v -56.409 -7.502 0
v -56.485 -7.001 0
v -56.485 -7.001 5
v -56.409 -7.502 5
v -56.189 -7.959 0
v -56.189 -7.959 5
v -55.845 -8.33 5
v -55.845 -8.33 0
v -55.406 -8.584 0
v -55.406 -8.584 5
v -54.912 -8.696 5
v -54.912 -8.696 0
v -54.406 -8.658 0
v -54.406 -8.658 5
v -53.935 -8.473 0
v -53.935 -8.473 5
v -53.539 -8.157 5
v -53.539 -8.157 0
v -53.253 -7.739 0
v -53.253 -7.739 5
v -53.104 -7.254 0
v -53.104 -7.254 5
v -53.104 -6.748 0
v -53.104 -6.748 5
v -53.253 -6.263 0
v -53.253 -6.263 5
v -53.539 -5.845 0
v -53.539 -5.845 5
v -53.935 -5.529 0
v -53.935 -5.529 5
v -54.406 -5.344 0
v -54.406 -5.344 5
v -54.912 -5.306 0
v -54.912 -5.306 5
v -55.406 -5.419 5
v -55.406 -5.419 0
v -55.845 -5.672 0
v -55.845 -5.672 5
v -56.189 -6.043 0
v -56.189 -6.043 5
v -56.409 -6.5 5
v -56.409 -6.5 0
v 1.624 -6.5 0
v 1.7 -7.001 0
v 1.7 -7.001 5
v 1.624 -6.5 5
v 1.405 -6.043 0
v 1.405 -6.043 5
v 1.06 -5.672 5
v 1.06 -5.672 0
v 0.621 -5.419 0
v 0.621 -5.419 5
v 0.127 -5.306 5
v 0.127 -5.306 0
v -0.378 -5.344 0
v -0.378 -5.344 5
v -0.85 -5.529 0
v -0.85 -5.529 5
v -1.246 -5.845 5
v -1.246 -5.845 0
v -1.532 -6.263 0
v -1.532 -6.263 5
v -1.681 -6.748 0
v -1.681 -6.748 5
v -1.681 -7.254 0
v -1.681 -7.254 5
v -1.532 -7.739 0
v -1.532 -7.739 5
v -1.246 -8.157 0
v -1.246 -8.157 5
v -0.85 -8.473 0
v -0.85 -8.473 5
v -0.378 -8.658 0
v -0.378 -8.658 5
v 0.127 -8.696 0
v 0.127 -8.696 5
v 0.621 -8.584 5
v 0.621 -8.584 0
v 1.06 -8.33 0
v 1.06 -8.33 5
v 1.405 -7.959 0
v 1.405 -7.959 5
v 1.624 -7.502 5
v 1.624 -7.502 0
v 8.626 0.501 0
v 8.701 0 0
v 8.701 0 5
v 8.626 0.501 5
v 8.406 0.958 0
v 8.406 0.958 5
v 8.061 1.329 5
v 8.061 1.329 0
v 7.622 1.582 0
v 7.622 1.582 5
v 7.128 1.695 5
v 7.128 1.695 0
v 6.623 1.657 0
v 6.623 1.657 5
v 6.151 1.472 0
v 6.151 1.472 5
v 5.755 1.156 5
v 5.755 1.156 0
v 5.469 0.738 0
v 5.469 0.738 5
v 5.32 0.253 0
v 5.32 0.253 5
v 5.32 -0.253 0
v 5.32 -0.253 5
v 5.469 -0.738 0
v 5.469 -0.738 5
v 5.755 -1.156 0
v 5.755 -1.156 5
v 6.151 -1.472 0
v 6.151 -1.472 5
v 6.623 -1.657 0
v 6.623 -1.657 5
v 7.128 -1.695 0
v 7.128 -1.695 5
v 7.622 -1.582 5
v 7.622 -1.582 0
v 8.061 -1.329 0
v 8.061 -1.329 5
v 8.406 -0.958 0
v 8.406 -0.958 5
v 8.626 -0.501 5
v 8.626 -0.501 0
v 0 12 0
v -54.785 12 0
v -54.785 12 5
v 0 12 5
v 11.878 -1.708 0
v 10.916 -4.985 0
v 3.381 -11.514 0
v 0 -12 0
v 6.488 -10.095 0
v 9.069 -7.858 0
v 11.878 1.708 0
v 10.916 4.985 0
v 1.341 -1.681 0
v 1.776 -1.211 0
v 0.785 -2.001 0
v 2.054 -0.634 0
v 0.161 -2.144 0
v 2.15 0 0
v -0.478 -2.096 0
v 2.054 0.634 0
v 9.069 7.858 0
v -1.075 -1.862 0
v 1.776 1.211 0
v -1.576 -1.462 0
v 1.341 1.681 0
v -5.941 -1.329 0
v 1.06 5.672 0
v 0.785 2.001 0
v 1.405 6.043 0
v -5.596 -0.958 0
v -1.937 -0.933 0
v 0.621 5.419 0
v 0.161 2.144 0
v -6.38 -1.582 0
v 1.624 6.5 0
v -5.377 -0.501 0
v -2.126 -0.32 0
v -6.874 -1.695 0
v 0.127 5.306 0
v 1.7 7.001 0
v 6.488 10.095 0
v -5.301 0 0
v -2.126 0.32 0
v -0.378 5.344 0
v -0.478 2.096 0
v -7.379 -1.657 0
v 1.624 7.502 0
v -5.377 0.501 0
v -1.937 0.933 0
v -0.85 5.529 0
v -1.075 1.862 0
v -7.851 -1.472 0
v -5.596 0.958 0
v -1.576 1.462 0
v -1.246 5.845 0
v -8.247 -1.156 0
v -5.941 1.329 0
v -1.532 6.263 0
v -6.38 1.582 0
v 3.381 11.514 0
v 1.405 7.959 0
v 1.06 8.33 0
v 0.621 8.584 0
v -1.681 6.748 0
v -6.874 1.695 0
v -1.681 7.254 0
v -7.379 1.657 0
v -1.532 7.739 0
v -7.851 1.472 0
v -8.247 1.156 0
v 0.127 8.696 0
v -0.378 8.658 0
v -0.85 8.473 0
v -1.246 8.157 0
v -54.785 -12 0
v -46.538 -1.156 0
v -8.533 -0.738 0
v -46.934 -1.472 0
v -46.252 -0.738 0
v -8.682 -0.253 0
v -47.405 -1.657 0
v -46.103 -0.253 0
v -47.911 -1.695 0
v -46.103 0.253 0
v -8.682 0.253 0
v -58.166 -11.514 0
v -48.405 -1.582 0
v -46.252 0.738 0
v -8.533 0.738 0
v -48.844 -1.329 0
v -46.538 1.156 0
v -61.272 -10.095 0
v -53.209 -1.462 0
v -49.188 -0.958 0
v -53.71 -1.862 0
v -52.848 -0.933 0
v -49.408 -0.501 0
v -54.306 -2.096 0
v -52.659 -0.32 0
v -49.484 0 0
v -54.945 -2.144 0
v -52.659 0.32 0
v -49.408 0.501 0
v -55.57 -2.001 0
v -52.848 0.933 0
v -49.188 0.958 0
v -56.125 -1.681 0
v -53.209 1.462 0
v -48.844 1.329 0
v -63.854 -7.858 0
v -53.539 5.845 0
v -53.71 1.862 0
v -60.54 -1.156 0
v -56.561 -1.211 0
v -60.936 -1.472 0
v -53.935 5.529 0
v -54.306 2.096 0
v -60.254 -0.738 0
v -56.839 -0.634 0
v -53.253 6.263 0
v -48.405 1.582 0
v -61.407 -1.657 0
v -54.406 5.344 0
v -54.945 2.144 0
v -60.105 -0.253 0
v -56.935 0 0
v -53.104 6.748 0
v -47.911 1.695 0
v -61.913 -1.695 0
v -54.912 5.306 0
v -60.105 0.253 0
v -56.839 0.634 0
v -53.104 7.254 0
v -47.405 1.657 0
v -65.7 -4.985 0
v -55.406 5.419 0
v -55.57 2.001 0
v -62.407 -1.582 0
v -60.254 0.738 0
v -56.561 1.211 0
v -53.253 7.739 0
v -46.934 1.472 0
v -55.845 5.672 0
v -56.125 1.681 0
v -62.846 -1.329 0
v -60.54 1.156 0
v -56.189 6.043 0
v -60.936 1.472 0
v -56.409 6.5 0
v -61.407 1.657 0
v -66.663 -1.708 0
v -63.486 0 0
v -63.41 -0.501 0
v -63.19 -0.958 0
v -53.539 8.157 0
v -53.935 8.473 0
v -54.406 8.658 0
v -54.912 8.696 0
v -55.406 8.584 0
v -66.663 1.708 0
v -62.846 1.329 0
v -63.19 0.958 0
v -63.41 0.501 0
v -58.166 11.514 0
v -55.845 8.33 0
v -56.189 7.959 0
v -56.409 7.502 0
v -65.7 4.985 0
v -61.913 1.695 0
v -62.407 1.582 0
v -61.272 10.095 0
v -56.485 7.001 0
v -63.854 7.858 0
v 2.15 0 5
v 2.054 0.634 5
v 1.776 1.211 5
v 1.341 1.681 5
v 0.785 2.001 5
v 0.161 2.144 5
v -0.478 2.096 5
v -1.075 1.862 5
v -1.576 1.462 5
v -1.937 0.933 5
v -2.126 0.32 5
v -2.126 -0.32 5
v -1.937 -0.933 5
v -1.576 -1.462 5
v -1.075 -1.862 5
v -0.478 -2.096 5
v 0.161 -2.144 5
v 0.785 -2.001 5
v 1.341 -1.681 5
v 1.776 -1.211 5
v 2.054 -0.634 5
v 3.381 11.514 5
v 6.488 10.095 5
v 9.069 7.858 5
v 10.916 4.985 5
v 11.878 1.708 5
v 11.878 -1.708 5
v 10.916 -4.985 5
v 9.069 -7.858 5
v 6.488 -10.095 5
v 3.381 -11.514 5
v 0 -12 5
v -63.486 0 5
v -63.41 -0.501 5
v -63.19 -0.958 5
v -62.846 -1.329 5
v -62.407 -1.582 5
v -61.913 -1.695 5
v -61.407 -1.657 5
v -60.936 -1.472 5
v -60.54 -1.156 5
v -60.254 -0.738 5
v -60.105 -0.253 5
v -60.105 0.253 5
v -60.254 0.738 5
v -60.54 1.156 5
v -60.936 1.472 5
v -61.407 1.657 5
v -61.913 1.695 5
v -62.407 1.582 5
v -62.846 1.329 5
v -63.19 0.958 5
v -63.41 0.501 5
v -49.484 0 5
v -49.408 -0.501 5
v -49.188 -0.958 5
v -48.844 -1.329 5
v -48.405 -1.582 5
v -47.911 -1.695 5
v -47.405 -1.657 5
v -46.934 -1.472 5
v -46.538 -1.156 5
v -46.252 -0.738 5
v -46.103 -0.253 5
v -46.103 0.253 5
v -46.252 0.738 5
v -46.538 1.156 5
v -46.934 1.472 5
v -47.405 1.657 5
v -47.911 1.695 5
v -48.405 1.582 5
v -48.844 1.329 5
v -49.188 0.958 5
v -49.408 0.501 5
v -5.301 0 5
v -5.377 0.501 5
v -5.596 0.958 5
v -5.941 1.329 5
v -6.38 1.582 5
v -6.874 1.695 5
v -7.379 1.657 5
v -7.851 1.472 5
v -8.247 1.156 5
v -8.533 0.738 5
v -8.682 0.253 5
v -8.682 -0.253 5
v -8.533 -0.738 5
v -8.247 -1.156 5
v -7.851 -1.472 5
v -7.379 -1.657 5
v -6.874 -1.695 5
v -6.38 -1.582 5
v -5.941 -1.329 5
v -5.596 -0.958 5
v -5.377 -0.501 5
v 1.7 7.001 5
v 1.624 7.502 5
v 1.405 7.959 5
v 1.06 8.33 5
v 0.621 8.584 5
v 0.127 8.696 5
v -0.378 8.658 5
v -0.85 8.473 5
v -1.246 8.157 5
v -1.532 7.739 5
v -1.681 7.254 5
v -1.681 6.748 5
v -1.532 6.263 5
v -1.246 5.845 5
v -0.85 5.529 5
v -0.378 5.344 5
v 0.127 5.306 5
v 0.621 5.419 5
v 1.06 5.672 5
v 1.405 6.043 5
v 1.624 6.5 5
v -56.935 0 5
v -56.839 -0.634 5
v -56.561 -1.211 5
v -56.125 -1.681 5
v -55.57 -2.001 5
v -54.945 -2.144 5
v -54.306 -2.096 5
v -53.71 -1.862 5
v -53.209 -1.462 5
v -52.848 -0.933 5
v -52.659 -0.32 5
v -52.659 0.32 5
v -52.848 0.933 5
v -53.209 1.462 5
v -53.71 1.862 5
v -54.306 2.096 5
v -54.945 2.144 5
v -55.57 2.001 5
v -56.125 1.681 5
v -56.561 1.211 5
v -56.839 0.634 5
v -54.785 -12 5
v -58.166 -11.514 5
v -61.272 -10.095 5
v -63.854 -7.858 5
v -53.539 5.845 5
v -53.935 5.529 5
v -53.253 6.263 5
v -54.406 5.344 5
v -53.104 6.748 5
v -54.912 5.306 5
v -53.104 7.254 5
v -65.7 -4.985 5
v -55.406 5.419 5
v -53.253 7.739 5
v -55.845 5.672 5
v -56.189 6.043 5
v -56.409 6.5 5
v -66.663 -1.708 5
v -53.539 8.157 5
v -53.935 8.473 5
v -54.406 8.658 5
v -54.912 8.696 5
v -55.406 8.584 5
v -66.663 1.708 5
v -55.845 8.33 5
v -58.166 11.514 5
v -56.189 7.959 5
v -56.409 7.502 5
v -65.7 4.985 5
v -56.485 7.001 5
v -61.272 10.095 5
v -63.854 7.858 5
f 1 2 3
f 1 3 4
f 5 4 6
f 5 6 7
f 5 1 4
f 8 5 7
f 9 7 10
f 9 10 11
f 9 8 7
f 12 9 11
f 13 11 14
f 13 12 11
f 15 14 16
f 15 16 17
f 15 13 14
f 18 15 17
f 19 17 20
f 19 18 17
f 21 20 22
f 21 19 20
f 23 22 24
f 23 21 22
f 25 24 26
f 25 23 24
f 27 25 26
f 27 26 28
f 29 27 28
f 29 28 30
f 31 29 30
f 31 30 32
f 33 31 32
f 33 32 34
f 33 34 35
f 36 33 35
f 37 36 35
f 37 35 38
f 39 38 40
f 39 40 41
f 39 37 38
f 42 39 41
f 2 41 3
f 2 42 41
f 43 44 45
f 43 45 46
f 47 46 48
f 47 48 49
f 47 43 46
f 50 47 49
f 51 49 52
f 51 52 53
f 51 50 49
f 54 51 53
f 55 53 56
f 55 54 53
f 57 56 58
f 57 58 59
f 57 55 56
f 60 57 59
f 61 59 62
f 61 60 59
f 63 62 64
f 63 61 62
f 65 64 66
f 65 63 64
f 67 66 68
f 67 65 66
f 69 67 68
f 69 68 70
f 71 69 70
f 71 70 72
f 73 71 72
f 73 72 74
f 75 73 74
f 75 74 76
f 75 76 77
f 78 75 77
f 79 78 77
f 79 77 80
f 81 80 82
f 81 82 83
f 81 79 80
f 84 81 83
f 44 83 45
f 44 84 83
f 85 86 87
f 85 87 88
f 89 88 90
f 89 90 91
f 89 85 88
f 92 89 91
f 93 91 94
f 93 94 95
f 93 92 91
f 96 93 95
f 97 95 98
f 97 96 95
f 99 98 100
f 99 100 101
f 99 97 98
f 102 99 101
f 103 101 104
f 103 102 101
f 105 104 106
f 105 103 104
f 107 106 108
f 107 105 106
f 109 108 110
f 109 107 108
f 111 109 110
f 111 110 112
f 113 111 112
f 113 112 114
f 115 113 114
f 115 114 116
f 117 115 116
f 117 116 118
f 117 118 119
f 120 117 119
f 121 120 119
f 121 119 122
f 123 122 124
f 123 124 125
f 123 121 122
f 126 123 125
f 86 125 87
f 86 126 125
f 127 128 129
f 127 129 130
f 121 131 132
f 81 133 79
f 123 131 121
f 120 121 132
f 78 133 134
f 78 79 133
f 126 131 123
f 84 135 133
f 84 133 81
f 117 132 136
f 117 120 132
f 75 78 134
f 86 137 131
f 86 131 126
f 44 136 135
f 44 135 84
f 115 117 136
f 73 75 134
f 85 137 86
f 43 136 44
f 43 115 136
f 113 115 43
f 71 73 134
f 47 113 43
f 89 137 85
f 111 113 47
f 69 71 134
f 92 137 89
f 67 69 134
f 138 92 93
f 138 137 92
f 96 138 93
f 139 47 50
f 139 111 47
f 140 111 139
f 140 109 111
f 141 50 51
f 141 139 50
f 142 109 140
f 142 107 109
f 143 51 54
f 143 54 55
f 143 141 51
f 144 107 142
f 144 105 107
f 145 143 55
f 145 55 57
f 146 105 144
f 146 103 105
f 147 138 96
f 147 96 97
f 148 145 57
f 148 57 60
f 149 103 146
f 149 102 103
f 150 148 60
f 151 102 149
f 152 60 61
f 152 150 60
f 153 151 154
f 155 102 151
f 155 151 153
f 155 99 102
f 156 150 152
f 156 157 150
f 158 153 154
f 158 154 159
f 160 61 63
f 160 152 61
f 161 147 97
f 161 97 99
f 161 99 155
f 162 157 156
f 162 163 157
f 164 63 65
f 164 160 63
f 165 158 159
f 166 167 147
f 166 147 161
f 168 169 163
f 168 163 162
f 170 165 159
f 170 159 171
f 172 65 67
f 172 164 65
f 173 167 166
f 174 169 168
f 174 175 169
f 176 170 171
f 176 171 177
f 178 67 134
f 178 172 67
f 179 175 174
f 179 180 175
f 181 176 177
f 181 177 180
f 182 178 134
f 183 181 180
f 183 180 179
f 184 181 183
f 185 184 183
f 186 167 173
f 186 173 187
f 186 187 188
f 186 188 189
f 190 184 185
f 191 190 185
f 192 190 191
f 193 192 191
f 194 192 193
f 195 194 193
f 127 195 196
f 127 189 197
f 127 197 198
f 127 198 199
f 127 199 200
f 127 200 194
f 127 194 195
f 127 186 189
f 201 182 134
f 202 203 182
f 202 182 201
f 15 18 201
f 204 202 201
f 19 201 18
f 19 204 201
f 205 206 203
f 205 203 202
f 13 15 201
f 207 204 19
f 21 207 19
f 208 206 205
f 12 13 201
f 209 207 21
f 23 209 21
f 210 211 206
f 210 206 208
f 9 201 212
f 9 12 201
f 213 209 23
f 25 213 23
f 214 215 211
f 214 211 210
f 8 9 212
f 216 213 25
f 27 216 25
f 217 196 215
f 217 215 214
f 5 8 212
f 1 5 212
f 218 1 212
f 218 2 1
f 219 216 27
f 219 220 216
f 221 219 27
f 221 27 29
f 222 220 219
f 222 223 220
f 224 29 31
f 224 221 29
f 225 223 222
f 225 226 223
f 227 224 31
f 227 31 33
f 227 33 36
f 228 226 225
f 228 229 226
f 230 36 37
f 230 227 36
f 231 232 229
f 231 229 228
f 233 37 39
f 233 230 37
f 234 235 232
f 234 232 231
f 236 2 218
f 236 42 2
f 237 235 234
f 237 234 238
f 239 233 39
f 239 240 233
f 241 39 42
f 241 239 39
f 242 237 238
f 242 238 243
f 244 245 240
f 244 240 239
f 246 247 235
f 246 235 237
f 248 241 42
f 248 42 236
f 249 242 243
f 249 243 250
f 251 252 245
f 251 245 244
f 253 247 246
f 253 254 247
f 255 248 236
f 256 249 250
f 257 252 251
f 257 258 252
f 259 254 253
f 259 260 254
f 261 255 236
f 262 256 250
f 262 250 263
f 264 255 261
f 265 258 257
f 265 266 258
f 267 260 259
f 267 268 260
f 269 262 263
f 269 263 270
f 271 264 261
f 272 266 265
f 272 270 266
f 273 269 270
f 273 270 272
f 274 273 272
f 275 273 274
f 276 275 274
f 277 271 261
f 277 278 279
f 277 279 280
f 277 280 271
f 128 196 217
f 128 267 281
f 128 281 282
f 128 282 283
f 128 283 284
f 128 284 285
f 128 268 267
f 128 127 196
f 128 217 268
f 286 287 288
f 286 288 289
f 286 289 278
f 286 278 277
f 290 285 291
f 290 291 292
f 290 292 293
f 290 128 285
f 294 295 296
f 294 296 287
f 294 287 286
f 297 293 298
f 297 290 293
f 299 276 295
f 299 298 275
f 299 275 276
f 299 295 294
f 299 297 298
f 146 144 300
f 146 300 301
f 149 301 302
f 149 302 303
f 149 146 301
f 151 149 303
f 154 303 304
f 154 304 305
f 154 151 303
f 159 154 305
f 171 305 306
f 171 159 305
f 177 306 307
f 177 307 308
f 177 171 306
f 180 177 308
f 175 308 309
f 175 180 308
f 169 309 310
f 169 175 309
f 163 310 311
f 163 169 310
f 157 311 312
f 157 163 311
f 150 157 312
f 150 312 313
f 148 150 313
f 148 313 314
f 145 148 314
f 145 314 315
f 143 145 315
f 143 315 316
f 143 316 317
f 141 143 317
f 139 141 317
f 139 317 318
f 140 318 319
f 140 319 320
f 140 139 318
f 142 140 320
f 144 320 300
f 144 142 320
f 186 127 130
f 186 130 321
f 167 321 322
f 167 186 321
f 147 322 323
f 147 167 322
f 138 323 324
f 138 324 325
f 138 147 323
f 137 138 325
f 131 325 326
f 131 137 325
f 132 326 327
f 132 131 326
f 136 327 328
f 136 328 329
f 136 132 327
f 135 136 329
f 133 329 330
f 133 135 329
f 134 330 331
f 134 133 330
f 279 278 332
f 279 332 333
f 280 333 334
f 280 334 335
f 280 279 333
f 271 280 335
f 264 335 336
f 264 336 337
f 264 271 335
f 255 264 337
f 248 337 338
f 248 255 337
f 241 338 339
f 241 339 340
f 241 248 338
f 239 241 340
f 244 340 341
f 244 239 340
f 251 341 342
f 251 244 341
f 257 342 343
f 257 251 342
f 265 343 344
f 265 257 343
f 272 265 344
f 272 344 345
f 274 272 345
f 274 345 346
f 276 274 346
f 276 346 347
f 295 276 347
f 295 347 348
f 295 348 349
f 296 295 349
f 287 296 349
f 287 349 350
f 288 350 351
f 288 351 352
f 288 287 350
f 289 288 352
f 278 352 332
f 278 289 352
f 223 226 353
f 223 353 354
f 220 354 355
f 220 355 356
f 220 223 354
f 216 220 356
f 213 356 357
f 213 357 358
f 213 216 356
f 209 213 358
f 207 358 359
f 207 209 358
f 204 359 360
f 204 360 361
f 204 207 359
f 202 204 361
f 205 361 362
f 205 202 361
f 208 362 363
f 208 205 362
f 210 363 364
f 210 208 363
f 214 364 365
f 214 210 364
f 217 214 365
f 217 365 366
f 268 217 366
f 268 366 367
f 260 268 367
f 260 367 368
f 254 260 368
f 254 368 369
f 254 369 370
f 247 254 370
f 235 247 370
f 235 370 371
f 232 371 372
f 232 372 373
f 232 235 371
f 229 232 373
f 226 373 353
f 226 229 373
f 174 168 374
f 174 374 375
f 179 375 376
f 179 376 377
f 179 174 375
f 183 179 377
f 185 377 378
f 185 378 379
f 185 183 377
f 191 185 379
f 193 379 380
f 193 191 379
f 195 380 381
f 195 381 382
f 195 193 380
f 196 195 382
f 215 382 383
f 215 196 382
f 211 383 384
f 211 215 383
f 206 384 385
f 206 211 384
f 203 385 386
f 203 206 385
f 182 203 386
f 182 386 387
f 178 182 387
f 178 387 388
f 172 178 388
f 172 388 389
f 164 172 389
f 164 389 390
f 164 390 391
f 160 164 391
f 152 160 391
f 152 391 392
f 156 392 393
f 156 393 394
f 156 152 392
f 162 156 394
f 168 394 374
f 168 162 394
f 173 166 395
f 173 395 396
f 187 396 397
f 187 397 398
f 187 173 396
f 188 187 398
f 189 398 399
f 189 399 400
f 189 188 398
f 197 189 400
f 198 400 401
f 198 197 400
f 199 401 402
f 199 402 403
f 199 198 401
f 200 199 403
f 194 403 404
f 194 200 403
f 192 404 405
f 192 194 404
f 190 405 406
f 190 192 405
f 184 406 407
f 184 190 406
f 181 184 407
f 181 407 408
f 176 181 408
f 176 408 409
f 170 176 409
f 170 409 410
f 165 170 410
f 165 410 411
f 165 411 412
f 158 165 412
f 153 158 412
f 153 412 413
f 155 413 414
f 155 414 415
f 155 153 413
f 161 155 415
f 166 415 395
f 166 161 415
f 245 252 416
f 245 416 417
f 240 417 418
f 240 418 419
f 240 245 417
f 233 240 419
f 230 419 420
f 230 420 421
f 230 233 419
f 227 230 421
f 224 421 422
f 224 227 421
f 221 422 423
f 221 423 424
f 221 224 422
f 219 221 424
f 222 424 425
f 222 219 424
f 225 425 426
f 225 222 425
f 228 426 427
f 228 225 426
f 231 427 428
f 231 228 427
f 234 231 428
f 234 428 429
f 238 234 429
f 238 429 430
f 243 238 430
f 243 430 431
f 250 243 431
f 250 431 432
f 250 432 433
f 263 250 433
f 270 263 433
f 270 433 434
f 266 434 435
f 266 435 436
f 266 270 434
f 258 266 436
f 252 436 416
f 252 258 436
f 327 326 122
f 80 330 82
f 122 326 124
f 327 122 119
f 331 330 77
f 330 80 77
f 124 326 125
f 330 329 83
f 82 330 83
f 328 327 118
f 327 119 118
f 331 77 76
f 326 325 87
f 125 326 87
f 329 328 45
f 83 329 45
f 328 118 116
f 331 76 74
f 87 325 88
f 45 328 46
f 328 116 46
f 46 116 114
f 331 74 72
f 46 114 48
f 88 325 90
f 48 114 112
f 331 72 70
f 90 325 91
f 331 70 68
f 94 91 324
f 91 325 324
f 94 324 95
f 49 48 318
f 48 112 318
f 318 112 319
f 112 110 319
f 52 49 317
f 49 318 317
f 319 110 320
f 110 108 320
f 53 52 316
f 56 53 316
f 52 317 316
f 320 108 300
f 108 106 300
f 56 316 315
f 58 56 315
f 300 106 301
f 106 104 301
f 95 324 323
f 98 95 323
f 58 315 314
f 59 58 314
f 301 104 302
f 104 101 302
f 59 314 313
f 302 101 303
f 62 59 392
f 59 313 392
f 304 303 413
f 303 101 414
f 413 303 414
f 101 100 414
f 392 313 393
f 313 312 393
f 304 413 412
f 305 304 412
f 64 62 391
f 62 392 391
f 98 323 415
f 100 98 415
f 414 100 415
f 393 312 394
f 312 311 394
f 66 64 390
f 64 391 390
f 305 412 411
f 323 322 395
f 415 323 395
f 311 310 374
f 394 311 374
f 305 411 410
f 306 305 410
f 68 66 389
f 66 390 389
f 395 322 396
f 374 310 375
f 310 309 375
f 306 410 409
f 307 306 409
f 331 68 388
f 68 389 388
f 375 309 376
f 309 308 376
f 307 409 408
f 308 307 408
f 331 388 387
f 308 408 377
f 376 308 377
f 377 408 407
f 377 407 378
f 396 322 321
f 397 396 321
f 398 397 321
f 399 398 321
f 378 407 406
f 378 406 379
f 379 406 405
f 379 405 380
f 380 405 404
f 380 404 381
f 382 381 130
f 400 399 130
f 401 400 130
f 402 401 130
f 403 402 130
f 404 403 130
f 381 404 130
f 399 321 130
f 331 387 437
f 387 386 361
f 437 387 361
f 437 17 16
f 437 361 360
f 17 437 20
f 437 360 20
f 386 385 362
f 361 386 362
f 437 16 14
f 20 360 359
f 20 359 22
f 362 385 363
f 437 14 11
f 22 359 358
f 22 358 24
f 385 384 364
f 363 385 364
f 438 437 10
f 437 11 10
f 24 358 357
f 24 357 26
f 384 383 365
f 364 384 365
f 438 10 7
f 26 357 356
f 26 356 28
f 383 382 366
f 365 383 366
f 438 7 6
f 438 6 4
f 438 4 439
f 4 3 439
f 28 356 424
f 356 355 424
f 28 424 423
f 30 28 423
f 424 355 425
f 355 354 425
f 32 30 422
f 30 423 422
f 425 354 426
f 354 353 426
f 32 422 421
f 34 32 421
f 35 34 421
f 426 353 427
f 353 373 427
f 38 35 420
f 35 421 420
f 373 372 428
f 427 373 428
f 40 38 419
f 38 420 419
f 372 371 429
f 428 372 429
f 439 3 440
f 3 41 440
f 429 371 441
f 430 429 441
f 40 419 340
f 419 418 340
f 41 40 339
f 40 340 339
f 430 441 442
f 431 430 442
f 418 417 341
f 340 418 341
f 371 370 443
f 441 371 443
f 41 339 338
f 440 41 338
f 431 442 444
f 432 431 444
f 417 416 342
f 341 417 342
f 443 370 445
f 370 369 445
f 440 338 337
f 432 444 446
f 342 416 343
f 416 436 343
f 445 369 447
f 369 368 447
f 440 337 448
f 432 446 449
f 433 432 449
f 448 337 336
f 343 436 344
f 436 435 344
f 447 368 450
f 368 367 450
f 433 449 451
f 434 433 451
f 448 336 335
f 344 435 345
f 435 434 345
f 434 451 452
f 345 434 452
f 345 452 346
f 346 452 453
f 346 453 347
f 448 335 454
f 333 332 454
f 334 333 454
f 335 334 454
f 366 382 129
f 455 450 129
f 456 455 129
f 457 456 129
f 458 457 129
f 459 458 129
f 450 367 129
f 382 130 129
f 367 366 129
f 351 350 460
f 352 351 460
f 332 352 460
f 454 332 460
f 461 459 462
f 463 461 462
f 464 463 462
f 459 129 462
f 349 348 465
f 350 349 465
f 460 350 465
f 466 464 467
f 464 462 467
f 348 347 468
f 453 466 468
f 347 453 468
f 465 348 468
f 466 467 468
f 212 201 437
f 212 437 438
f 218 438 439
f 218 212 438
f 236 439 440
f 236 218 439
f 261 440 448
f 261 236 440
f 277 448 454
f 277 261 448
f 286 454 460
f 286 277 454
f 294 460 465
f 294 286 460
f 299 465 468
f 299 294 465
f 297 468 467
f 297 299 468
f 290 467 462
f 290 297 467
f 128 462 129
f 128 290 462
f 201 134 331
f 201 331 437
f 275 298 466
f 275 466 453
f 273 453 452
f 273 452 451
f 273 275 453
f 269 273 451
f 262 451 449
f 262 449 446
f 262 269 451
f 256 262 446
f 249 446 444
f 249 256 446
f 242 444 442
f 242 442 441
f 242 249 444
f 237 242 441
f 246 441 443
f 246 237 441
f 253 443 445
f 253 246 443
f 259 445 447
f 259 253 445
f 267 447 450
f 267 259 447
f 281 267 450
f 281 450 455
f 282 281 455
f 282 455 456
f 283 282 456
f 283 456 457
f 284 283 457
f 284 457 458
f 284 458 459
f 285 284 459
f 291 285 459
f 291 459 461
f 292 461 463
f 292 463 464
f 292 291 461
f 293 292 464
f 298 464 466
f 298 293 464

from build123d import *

# Parameters (mm, degrees)
SZKIC1_R                    = 1.7
SZKIC1_R_2                  = 2.15
DODANIE_WYCI_GNI_CIE1_DEPTH = 5


with BuildPart() as part:
    # Szkic1 → Dodanie-wyciągnięcie1 (new body)
    with BuildSketch(Plane.XY):
        with BuildLine():
            Line((0, -12), (-54.784750049, -12))
            ThreePointArc((-54.784750049, -12), (-66.784750049, 0), (-54.784750049, 12))
            Line((-54.784750049, 12), (0, 12))
            ThreePointArc((0, 12), (12, 0), (0, -12))
        make_face()
        with Locations((0, 7.001028496)):
            Circle(SZKIC1_R, mode=Mode.SUBTRACT)
        Circle(SZKIC1_R_2, mode=Mode.SUBTRACT)
        with Locations((7.001028496, 0)):
            Circle(SZKIC1_R, mode=Mode.SUBTRACT)
        with Locations((0, -7.001028496)):
            Circle(SZKIC1_R, mode=Mode.SUBTRACT)
        with Locations((-7.001028496, 0)):
            Circle(SZKIC1_R, mode=Mode.SUBTRACT)
        with Locations(Location((-47.783721554, 0, 0), (0, 0, 180))):
            Circle(SZKIC1_R, mode=Mode.SUBTRACT)
        with Locations(Location((-54.784750049, -7.001028496, 0), (0, 0, 180))):
            Circle(SZKIC1_R, mode=Mode.SUBTRACT)
        with Locations(Location((-61.785778545, 0, 0), (0, 0, 180))):
            Circle(SZKIC1_R, mode=Mode.SUBTRACT)
        with Locations(Location((-54.784750049, 0, 0), (0, 0, 180))):
            Circle(SZKIC1_R_2, mode=Mode.SUBTRACT)
        with Locations(Location((-54.784750049, 7.001028496, 0), (0, 0, 180))):
            Circle(SZKIC1_R, mode=Mode.SUBTRACT)
    extrude(amount=DODANIE_WYCI_GNI_CIE1_DEPTH)


solid = part.part
